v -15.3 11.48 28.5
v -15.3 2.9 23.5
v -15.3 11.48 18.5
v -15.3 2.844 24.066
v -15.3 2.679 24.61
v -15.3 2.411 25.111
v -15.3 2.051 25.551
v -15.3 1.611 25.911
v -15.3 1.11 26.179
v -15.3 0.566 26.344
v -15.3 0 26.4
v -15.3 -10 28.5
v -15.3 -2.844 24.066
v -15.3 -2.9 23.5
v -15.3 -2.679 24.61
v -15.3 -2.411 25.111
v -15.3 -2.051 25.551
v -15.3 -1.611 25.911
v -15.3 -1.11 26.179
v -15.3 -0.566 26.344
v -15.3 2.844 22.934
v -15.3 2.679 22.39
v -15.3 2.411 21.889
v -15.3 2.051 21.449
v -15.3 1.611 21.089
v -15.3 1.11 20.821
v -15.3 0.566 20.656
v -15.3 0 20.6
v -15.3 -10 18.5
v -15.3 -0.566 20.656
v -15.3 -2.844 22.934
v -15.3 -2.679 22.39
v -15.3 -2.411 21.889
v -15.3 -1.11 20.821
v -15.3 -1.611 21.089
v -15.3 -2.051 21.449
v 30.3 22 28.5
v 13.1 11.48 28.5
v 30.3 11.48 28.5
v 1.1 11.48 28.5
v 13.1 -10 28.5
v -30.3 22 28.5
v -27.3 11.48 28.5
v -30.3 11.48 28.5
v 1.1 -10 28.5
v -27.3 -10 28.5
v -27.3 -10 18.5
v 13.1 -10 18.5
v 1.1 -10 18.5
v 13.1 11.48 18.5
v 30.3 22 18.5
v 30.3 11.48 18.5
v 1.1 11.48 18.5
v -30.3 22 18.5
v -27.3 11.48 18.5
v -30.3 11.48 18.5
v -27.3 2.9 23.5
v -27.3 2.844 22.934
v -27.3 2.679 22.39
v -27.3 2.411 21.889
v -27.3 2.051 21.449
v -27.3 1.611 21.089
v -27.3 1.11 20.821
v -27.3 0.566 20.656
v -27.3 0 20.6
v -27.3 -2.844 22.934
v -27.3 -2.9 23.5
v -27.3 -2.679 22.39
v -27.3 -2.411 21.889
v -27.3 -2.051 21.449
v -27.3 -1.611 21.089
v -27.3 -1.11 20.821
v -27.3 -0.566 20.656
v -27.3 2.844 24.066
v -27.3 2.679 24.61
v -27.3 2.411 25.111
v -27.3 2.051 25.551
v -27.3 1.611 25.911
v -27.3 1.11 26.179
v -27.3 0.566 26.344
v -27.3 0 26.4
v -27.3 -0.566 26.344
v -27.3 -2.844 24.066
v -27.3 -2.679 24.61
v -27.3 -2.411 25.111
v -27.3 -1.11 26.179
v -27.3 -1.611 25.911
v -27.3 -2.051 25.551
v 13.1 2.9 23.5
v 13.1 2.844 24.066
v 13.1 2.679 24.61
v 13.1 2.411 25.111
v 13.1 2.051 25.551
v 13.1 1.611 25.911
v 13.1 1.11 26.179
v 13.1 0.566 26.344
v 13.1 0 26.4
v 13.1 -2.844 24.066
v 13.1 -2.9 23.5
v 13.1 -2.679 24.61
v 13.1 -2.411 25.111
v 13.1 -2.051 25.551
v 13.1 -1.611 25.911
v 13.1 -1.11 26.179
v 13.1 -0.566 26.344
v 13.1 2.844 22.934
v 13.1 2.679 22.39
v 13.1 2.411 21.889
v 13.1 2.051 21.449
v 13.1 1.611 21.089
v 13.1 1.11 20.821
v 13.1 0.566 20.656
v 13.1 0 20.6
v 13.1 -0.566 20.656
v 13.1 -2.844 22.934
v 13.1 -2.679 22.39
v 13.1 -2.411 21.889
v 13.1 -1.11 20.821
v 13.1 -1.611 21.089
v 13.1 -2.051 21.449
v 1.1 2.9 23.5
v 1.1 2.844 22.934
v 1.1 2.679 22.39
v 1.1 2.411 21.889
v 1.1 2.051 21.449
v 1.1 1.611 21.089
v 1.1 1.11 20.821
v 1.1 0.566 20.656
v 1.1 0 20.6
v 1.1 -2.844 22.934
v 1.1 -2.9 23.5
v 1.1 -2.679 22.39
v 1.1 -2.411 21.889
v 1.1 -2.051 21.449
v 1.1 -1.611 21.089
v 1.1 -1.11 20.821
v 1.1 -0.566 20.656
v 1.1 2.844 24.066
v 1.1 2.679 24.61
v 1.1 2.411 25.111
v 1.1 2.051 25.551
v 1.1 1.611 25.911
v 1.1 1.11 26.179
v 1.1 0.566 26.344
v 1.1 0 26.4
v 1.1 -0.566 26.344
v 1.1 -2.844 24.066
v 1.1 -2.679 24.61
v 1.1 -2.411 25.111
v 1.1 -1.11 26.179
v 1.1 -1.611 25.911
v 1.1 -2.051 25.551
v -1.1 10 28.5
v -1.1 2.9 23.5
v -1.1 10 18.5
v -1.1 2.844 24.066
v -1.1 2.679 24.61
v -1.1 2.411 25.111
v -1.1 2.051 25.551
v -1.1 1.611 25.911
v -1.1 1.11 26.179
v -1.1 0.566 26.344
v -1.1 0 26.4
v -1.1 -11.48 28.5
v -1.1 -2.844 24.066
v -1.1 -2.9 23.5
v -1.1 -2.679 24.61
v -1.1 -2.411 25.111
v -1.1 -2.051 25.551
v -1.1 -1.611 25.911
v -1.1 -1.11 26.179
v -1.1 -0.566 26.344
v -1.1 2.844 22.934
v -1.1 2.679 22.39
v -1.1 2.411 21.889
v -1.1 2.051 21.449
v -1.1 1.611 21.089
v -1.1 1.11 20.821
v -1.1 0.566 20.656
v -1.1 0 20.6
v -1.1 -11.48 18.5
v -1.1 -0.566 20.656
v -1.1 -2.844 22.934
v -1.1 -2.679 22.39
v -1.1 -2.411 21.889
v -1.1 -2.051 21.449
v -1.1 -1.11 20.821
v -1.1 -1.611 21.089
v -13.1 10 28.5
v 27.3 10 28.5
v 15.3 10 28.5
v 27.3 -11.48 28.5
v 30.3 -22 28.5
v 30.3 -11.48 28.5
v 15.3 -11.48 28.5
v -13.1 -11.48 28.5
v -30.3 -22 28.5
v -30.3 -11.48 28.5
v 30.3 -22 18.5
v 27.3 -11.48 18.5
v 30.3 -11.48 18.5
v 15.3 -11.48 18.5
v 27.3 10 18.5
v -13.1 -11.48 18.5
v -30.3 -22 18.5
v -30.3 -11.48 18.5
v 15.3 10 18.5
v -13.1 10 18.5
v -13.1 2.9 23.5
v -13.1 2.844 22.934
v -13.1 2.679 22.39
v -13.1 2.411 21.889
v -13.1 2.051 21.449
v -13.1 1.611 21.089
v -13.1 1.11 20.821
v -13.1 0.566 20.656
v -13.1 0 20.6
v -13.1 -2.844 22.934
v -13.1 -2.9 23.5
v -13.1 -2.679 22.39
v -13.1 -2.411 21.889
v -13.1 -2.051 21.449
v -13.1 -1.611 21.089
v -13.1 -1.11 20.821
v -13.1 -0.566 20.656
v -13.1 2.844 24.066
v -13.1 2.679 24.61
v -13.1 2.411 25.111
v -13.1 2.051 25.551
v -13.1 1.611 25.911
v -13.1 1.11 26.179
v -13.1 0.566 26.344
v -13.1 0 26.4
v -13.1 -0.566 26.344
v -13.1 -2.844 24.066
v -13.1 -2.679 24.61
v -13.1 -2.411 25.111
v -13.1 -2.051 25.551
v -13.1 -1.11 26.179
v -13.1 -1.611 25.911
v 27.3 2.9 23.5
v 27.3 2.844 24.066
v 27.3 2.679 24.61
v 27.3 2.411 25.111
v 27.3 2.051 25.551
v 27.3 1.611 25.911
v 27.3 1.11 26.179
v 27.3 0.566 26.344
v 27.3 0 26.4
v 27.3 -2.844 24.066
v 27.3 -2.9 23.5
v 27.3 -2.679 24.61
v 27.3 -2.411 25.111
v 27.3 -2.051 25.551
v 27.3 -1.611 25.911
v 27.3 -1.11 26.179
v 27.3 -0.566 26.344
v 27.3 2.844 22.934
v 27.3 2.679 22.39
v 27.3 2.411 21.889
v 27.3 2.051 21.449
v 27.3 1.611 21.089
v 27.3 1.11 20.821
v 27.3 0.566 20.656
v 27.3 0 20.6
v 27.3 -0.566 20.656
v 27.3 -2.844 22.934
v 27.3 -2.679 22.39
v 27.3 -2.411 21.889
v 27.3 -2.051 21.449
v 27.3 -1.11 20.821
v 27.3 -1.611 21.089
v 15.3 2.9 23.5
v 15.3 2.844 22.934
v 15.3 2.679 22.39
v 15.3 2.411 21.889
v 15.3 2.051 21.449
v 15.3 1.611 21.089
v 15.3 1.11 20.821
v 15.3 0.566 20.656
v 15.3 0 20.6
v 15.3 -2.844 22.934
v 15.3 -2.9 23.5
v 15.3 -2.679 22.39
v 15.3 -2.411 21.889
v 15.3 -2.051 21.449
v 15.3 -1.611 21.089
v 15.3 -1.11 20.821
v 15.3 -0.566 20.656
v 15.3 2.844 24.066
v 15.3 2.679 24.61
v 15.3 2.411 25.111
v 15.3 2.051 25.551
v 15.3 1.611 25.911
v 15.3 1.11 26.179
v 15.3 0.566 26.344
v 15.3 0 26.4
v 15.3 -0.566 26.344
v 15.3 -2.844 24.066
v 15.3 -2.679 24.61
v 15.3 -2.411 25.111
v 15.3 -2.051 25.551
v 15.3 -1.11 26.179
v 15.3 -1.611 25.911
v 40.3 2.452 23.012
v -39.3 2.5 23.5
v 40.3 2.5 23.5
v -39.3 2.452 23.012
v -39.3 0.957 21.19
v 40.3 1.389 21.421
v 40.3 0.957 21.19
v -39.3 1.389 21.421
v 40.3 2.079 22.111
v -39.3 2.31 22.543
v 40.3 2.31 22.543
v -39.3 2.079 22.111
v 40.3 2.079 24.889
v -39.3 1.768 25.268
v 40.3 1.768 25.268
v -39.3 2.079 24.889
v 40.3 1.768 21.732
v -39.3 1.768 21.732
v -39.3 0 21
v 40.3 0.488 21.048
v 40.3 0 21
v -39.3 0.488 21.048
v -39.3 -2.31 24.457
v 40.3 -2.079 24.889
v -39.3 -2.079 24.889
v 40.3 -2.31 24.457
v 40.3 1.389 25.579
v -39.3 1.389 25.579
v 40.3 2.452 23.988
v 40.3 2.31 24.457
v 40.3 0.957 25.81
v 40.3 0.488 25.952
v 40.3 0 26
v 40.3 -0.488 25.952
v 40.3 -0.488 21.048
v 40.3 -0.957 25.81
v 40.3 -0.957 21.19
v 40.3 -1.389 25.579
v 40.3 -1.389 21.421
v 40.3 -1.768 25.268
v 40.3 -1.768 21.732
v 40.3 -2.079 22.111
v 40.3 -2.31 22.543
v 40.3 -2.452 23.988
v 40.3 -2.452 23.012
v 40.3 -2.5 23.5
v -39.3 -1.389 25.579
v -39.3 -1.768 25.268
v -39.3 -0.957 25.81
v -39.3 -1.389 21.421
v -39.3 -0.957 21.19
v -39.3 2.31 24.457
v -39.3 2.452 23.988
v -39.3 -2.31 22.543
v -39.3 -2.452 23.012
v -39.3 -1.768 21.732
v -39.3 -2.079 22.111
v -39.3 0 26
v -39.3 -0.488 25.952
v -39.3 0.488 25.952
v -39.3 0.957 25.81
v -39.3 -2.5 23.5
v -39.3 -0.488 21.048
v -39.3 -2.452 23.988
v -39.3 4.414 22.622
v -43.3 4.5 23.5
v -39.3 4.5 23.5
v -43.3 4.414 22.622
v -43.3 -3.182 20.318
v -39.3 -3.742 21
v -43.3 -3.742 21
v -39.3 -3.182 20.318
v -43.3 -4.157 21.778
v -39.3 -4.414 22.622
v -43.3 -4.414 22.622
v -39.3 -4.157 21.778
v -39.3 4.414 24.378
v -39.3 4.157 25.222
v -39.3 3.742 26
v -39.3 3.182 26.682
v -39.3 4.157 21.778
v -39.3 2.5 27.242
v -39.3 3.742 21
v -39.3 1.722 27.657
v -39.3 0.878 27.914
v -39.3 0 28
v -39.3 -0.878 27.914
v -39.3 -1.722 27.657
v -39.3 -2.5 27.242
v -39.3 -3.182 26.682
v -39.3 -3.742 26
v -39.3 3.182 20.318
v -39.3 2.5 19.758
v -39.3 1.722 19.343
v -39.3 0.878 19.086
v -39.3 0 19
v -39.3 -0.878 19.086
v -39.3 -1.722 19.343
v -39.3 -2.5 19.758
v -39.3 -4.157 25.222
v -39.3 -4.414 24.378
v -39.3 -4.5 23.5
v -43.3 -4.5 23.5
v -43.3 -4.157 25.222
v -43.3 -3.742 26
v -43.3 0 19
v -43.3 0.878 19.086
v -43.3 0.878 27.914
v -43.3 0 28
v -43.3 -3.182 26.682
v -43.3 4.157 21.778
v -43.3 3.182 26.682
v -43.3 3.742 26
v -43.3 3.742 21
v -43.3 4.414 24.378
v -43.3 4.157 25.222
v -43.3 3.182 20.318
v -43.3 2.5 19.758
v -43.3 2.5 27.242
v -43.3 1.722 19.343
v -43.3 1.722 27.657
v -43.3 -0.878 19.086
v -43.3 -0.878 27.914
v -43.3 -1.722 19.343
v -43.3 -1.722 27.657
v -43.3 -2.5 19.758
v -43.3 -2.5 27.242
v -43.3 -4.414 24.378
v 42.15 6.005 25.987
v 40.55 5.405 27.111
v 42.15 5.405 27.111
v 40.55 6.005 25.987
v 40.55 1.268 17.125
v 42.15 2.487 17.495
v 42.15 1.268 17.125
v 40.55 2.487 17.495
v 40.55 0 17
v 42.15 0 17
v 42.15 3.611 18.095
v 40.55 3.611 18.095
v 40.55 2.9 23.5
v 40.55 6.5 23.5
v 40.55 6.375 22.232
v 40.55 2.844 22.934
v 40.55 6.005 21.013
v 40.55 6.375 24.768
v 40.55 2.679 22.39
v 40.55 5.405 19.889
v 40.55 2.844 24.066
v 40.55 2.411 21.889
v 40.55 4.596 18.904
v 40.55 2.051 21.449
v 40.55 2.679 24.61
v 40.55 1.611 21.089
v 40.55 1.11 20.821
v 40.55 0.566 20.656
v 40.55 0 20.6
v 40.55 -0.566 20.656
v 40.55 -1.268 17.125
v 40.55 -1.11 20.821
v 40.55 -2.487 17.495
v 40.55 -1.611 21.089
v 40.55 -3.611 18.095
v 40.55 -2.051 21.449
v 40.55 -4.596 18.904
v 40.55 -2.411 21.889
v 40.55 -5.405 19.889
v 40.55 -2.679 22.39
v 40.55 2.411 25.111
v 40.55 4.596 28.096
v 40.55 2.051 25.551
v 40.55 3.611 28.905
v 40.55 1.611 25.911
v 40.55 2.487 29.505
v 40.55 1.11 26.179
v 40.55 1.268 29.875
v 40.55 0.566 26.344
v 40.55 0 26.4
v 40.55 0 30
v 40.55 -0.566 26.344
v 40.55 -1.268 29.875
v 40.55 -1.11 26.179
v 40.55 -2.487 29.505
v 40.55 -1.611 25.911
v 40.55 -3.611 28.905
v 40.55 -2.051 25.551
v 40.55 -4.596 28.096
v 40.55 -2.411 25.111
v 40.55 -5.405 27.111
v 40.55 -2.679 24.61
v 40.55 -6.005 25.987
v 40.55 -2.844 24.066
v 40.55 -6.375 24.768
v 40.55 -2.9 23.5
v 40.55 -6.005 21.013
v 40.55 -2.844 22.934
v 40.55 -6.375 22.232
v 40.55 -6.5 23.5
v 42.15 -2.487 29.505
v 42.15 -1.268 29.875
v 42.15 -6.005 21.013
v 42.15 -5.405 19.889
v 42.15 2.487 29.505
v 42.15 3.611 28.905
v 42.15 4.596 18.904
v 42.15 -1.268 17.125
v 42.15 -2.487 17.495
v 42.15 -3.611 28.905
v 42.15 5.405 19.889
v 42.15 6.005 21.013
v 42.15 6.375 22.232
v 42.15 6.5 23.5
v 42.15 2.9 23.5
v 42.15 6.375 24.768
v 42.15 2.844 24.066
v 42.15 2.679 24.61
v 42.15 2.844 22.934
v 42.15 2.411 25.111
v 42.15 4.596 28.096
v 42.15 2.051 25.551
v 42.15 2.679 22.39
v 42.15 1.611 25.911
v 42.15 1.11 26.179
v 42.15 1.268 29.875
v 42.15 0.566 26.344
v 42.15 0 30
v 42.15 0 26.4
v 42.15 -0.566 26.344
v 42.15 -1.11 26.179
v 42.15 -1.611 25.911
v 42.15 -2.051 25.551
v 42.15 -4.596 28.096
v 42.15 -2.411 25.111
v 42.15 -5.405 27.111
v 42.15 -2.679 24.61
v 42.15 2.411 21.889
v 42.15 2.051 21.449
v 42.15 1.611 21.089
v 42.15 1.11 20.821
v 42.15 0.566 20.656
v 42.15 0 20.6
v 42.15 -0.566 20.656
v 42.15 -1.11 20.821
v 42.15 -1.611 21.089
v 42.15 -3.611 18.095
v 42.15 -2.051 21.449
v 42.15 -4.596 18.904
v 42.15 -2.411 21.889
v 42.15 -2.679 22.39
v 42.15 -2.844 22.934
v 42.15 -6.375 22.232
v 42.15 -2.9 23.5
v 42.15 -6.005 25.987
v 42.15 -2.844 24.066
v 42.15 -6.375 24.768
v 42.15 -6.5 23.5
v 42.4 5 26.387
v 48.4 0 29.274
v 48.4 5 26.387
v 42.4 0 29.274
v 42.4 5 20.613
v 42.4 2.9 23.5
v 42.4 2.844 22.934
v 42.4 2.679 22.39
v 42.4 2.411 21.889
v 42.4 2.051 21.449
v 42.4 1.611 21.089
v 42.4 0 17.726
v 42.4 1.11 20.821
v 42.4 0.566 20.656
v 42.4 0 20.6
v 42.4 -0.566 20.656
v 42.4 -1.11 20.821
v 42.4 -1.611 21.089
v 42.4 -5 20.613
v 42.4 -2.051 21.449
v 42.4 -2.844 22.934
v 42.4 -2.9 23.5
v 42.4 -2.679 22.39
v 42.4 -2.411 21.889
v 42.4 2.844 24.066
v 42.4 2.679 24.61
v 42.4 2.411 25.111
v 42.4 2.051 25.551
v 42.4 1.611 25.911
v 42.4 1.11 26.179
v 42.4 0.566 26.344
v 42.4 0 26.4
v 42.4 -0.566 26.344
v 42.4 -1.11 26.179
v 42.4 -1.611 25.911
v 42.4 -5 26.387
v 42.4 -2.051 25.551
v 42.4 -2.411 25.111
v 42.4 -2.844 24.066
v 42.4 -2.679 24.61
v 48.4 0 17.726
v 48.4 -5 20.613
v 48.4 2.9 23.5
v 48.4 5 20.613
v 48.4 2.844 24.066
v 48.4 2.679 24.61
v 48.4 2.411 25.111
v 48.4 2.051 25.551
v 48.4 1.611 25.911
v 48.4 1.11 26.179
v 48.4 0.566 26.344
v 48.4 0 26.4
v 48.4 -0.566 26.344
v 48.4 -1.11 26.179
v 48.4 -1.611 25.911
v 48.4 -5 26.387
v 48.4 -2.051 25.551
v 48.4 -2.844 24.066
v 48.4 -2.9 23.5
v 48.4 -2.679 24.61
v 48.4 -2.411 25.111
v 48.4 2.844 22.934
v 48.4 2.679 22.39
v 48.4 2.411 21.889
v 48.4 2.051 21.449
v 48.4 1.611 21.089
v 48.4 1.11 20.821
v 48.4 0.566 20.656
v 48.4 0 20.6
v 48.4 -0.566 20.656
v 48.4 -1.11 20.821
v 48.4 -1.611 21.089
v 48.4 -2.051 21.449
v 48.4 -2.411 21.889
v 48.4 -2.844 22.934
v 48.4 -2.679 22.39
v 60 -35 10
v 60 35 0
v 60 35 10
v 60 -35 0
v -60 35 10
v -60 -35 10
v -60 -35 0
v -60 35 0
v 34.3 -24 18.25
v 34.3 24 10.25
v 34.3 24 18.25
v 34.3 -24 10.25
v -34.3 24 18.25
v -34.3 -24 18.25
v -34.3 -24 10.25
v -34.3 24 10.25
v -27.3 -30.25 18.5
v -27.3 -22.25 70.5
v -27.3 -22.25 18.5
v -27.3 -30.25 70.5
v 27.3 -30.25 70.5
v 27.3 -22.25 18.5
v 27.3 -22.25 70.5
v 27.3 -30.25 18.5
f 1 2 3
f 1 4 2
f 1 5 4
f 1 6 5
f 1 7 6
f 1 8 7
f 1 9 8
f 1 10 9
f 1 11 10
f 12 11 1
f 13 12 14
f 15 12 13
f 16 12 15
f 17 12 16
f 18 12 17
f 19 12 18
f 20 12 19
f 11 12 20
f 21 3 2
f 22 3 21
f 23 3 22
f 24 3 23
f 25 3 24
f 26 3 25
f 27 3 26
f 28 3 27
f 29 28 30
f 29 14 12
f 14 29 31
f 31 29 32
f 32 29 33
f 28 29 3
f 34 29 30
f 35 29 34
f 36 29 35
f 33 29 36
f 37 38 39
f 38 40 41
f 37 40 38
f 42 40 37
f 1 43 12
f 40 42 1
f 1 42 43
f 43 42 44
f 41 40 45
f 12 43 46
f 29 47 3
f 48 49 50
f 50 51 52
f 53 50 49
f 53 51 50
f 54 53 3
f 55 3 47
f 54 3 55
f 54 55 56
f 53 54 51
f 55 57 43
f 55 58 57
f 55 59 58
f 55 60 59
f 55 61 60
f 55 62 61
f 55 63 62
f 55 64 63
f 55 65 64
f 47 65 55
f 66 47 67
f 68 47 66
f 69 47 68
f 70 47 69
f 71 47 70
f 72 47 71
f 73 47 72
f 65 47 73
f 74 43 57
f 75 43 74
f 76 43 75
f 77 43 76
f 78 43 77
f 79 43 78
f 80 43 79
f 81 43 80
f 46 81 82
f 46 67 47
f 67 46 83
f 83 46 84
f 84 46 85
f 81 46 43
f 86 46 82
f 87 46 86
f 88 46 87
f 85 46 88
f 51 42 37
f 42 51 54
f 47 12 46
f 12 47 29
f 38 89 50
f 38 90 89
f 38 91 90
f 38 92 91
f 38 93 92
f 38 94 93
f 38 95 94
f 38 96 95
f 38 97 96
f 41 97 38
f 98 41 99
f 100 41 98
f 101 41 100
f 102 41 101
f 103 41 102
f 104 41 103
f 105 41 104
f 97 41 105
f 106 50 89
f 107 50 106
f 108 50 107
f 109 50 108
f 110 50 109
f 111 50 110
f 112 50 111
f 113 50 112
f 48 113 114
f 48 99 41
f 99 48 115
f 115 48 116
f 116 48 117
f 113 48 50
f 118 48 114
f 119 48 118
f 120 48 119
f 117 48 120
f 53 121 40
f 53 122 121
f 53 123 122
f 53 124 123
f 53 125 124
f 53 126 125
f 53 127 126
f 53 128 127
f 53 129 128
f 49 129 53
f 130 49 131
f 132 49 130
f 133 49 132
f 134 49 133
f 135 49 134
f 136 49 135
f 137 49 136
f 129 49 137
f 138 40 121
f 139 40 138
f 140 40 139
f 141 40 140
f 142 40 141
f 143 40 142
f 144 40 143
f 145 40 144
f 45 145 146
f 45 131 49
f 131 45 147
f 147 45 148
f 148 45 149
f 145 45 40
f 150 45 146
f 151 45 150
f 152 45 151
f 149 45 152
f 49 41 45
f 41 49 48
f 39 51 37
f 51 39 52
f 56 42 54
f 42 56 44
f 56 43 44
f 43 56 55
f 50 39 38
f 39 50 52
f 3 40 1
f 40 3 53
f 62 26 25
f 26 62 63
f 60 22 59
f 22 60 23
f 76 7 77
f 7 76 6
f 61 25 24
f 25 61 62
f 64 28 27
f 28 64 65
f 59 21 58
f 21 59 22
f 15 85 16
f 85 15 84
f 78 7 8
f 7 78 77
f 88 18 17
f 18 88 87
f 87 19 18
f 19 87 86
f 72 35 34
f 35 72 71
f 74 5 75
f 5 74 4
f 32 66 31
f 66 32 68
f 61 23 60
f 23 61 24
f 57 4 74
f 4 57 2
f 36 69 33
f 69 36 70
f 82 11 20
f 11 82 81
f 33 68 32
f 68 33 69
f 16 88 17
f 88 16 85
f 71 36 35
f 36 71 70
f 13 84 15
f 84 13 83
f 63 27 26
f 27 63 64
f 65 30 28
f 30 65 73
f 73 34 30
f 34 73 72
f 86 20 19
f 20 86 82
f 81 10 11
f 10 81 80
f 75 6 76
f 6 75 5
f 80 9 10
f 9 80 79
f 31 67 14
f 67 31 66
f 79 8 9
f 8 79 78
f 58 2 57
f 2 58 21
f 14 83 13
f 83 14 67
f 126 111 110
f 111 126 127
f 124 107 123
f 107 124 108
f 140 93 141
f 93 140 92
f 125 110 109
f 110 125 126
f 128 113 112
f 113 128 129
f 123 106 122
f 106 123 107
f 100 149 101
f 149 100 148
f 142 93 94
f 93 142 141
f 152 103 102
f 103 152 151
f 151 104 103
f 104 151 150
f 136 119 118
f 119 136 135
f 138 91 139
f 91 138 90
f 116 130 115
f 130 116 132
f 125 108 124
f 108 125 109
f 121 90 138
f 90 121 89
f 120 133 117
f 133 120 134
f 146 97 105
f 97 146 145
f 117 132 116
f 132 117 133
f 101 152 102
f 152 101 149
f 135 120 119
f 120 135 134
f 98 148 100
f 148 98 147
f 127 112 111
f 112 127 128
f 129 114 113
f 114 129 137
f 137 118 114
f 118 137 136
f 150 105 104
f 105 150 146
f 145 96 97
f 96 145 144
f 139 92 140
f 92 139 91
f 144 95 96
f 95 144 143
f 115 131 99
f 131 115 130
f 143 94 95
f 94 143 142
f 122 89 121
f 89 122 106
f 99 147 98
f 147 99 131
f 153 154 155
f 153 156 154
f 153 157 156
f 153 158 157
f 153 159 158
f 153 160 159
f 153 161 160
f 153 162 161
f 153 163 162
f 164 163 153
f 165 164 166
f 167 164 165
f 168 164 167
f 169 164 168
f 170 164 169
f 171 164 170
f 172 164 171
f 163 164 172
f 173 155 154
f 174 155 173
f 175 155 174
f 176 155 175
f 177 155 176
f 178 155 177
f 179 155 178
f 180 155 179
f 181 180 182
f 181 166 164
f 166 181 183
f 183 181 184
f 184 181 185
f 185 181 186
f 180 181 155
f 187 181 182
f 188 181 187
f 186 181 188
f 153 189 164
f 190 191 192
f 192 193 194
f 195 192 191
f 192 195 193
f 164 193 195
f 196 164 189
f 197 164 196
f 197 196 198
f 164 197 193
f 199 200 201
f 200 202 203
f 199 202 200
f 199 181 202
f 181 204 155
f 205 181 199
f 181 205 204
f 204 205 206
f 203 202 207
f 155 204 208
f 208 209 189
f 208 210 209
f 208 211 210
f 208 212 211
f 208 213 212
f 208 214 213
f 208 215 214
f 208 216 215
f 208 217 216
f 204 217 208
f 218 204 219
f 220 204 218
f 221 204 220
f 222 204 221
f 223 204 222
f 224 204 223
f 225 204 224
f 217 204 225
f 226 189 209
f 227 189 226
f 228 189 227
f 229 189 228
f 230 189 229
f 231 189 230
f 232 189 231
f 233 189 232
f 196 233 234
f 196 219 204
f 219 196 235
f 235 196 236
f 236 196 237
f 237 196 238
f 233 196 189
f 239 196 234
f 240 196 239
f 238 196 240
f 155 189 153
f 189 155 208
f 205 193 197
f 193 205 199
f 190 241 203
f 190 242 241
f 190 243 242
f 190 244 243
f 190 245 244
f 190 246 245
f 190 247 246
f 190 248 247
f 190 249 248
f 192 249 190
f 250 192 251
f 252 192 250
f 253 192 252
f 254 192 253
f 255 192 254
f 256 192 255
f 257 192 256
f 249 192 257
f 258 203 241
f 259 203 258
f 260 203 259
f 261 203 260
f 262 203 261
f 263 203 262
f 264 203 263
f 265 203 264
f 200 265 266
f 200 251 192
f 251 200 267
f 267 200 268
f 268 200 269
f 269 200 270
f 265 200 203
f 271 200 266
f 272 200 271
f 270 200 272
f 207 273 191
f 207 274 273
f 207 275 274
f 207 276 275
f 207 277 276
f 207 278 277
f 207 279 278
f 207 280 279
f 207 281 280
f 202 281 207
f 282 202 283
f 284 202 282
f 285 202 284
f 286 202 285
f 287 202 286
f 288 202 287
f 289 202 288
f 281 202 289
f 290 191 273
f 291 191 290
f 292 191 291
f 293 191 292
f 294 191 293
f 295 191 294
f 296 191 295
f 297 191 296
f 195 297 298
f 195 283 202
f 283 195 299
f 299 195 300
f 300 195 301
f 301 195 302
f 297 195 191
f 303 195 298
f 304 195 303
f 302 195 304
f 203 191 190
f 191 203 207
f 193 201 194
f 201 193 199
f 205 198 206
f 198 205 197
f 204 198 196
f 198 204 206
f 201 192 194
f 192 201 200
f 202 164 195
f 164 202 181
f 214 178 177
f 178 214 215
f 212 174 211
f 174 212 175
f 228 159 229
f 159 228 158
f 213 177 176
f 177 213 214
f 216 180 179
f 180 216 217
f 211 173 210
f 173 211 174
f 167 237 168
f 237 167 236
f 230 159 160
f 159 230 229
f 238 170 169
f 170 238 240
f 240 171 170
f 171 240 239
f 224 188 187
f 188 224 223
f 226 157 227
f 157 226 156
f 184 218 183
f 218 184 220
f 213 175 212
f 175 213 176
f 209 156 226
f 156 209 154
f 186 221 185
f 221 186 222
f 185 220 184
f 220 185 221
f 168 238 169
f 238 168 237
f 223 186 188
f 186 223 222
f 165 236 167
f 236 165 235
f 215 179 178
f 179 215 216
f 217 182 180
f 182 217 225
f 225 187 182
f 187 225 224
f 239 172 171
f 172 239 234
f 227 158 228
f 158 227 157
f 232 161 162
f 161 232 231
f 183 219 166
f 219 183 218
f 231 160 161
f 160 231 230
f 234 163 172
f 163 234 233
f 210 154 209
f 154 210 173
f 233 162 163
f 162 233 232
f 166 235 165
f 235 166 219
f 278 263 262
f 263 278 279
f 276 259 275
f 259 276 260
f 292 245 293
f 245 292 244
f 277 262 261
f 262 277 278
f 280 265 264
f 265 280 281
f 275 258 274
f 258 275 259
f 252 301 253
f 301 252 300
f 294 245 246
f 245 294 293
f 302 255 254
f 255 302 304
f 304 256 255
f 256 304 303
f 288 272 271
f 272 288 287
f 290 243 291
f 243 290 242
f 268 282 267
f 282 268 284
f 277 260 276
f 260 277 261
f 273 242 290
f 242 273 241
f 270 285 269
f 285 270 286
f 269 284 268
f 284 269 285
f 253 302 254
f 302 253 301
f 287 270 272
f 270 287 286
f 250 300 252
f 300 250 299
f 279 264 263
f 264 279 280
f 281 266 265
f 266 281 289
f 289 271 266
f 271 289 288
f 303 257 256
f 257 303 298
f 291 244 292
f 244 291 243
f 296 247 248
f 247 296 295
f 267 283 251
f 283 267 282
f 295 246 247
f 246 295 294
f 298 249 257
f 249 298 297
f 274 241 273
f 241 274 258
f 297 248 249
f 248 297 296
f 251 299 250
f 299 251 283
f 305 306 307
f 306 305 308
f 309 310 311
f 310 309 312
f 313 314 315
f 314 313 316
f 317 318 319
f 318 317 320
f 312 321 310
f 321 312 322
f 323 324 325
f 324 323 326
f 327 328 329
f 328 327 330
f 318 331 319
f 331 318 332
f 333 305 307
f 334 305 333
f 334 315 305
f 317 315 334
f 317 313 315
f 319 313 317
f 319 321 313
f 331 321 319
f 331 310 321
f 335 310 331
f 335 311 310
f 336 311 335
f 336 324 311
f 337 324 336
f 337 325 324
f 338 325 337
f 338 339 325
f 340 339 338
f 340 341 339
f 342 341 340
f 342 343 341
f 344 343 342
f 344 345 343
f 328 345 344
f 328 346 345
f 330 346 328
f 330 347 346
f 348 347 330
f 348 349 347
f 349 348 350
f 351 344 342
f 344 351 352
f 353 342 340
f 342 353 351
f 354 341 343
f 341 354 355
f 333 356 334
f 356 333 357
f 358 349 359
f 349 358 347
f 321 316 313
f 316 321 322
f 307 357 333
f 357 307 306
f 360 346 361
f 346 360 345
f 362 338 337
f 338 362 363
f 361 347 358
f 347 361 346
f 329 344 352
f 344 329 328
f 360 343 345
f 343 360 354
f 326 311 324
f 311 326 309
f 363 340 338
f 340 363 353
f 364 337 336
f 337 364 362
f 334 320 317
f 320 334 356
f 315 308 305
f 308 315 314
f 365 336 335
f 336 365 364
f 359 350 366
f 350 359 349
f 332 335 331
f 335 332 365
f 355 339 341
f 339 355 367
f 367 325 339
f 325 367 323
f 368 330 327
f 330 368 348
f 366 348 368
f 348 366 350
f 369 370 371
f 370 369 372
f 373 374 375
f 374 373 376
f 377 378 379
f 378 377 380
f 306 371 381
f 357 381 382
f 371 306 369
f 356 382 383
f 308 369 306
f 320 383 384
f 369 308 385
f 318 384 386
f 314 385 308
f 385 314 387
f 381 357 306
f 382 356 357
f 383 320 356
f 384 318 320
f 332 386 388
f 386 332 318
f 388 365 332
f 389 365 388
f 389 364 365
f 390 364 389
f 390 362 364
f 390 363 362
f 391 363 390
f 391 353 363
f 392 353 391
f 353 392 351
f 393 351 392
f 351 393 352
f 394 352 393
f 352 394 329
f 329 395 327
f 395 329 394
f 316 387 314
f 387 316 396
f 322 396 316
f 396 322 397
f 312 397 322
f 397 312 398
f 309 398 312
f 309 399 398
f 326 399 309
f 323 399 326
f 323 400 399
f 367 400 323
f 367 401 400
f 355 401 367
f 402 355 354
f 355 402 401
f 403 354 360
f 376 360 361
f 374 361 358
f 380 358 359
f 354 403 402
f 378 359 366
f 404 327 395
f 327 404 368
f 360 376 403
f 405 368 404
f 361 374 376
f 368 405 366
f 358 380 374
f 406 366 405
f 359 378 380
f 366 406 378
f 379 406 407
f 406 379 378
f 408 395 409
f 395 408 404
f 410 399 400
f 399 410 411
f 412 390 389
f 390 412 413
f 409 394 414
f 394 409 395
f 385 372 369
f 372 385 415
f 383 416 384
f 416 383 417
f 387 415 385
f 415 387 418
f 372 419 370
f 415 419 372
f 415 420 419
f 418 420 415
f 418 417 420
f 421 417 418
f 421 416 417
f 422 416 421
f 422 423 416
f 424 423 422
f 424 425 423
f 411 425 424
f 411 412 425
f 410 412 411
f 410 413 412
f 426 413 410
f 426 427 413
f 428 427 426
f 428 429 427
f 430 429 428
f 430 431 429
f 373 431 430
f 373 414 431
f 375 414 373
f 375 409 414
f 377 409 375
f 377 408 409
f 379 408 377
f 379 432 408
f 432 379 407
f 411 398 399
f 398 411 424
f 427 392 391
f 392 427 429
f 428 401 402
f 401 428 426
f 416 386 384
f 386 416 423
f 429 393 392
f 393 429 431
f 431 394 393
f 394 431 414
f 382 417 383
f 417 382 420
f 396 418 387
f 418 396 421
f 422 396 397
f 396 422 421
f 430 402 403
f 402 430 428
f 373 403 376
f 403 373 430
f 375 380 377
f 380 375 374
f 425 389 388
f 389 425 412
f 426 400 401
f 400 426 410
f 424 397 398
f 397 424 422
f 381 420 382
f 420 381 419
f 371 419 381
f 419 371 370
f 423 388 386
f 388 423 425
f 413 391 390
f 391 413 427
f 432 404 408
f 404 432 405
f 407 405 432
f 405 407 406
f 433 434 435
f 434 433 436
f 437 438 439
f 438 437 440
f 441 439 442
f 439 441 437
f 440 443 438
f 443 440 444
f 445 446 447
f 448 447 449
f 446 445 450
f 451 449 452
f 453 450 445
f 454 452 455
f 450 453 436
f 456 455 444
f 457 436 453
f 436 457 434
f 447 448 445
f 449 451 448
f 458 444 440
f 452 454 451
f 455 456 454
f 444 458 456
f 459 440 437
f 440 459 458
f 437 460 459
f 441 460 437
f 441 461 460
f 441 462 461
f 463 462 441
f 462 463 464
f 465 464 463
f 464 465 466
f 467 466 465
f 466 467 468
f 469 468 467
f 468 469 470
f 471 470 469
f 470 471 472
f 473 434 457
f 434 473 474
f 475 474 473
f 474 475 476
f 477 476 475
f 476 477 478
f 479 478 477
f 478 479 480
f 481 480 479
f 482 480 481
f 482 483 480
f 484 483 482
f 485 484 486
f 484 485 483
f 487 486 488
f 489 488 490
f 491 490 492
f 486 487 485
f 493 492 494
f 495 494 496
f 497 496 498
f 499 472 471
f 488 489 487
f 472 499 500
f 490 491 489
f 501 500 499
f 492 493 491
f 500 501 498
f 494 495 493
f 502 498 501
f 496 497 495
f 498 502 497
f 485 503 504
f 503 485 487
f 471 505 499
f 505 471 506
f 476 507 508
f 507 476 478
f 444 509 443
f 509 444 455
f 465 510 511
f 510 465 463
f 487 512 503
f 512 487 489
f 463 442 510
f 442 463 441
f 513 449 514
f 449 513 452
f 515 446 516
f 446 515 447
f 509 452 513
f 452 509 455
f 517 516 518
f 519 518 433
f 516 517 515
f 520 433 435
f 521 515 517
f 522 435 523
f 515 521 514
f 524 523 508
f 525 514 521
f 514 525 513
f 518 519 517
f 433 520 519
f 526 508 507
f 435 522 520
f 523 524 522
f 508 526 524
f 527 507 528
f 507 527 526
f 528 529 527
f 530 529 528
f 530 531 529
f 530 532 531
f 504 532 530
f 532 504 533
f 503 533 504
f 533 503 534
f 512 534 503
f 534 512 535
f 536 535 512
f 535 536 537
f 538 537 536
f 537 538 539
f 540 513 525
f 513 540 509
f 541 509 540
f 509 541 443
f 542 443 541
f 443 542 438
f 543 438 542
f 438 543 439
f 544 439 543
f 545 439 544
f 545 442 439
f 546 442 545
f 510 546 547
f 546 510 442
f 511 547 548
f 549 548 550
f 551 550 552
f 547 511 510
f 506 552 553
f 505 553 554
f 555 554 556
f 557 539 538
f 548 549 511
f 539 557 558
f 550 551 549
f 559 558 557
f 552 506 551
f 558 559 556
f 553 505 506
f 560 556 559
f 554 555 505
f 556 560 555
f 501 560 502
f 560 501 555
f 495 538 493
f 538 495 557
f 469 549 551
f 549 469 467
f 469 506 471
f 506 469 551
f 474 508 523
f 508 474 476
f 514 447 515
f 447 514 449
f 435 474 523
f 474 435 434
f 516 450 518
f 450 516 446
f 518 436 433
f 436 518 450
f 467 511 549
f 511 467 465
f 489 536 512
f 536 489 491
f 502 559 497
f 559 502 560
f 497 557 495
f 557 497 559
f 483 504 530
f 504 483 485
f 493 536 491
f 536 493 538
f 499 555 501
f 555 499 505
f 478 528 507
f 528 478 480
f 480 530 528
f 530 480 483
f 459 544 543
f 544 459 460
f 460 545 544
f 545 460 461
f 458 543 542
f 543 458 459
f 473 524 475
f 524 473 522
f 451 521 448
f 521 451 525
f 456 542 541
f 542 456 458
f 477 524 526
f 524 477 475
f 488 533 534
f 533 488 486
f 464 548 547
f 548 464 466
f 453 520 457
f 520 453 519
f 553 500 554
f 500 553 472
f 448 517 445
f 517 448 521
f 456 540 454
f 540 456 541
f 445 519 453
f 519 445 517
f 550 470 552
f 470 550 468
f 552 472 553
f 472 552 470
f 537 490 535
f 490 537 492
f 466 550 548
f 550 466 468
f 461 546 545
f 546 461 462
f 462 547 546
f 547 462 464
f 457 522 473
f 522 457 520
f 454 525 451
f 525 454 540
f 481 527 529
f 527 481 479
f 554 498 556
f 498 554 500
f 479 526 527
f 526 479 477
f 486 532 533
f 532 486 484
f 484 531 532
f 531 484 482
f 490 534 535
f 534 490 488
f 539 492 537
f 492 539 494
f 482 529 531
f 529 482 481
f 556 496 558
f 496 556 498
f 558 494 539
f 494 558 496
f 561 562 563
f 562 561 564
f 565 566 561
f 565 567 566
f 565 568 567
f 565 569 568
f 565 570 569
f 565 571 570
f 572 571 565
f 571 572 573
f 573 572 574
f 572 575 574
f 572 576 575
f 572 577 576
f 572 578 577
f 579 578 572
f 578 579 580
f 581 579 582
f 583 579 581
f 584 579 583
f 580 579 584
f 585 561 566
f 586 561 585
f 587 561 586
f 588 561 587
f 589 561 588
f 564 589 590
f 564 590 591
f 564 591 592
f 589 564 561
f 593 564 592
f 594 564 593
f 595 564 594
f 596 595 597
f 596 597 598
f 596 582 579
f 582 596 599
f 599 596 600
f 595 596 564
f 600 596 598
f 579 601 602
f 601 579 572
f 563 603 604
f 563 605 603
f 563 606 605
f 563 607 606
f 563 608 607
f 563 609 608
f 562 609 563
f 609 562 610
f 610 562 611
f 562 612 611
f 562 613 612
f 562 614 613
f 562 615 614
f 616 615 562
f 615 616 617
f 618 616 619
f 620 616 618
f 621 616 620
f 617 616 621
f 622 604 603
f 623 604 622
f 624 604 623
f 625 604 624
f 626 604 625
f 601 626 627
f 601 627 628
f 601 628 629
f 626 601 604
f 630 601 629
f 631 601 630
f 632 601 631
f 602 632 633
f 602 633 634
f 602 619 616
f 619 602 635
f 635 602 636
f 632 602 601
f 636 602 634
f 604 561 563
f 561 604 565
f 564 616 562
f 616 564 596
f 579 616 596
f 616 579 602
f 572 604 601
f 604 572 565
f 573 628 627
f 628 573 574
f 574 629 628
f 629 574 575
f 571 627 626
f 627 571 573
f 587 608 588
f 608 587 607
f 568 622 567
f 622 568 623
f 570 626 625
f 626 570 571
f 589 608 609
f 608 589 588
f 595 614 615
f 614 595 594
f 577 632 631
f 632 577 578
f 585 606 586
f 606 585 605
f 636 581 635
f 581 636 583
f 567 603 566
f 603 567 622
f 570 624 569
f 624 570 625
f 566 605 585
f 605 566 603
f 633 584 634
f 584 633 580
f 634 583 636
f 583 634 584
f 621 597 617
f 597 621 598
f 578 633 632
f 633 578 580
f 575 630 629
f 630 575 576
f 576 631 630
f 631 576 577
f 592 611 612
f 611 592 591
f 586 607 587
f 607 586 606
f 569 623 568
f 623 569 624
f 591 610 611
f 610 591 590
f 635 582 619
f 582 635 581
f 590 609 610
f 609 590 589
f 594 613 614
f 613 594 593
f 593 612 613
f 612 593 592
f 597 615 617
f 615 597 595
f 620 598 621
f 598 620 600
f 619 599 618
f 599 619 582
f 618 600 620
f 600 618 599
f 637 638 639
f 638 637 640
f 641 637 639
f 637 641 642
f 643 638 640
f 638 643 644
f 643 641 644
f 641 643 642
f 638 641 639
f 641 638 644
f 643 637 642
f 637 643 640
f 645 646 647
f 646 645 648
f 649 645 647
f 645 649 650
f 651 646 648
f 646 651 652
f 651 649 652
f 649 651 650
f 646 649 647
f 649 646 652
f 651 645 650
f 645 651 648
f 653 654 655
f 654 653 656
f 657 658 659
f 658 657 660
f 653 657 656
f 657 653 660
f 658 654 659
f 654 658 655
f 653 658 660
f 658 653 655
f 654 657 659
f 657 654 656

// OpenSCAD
$fn = 32;

// ------------------------------------------------------------------------
// Comb hinge with flap: leaf 60.6 x 22 mm, pin d5, flap 52 mm
// Every part is its own module, assembly() places every instance.
// ------------------------------------------------------------------------

// --- part 1 ---
module hinge_bed() {
  difference() {
    translate([-60, -35, 0]) cube([120, 70, 10]);
  }
}

// --- part 2 ---
module hinge_riser() {
  difference() {
    translate([-34.3, -24, 0]) cube([68.6, 48, 8]);
  }
}

// --- part 3 ---
module hinge_leaf_a() {
  difference() {
    union() {
      translate([-27.3, -10, -5]) cube([12, 32, 10]);
      translate([1.1, -10, -5]) cube([12, 32, 10]);
      translate([-30.3, 11.48, -5]) cube([60.6, 10.52, 10]);
    }
    translate([-21.3, 0, 0]) rotate([0, 90, 0]) cylinder(h = 14, d = 5.8, center = true);
    translate([7.1, 0, 0]) rotate([0, 90, 0]) cylinder(h = 14, d = 5.8, center = true);
  }
}

// --- part 4 ---
module hinge_leaf_b() {
  difference() {
    union() {
      translate([-13.1, -22, -5]) cube([12, 32, 10]);
      translate([15.3, -22, -5]) cube([12, 32, 10]);
      translate([-30.3, -22, -5]) cube([60.6, 10.52, 10]);
    }
    translate([-7.1, 0, 0]) rotate([0, 90, 0]) cylinder(h = 14, d = 5.8, center = true);
    translate([21.3, 0, 0]) rotate([0, 90, 0]) cylinder(h = 14, d = 5.8, center = true);
  }
}

// --- part 5 ---
module hinge_flap() {
  difference() {
    translate([-27.3, -26, 0]) cube([54.6, 52, 8]);
  }
}

// --- part 6 ---
module hinge_pin() {
  rotate([0, 90, 0]) cylinder(h = 80.6, d = 5, center = true);
  translate([-43.3, 0, 0]) rotate([0, 90, 0]) cylinder(h = 4, d = 9);
}

// --- part 7 ---
module pin_washer() {
  difference() {
      translate([0, 0, 0]) cylinder(h = 1.6, d = 13);
      translate([0, 0, -1]) cylinder(h = 3.6, d = 5.8);
    }
}

// --- part 8 ---
module pin_nut() {
  difference() {
    linear_extrude(height = 6) polygon(points = [[5.774, 0], [2.887, 5], [-2.887, 5], [-5.774, 0], [-2.887, -5], [2.887, -5]]);
    translate([0, 0, -1]) cylinder(h = 8, d = 5.8);
  }
}

// --- assembly ---
module assembly() {
  color([0.80, 0.24, 0.20]) translate([0, 0, 0]) rotate([0, 0, 0]) hinge_bed();
  color([0.20, 0.45, 0.75]) translate([0, 0, 10.25]) rotate([0, 0, 0]) hinge_riser();
  color([0.25, 0.62, 0.32]) translate([0, 0, 23.5]) rotate([0, 0, 0]) hinge_leaf_a();
  color([0.92, 0.70, 0.18]) translate([0, 0, 23.5]) rotate([0, 0, 0]) hinge_leaf_b();
  color([0.58, 0.35, 0.70]) translate([0, -22.25, 44.5]) rotate([90, 0, 0]) hinge_flap();
  color([0.16, 0.66, 0.66]) translate([0, 0, 23.5]) rotate([0, 0, 0]) hinge_pin();
  color([0.85, 0.48, 0.18]) translate([40.55, 0, 23.5]) rotate([0, 90, 0]) pin_washer();
  color([0.55, 0.60, 0.65]) translate([42.4, 0, 23.5]) rotate([0, 90, 0]) pin_nut();
}

assembly();
